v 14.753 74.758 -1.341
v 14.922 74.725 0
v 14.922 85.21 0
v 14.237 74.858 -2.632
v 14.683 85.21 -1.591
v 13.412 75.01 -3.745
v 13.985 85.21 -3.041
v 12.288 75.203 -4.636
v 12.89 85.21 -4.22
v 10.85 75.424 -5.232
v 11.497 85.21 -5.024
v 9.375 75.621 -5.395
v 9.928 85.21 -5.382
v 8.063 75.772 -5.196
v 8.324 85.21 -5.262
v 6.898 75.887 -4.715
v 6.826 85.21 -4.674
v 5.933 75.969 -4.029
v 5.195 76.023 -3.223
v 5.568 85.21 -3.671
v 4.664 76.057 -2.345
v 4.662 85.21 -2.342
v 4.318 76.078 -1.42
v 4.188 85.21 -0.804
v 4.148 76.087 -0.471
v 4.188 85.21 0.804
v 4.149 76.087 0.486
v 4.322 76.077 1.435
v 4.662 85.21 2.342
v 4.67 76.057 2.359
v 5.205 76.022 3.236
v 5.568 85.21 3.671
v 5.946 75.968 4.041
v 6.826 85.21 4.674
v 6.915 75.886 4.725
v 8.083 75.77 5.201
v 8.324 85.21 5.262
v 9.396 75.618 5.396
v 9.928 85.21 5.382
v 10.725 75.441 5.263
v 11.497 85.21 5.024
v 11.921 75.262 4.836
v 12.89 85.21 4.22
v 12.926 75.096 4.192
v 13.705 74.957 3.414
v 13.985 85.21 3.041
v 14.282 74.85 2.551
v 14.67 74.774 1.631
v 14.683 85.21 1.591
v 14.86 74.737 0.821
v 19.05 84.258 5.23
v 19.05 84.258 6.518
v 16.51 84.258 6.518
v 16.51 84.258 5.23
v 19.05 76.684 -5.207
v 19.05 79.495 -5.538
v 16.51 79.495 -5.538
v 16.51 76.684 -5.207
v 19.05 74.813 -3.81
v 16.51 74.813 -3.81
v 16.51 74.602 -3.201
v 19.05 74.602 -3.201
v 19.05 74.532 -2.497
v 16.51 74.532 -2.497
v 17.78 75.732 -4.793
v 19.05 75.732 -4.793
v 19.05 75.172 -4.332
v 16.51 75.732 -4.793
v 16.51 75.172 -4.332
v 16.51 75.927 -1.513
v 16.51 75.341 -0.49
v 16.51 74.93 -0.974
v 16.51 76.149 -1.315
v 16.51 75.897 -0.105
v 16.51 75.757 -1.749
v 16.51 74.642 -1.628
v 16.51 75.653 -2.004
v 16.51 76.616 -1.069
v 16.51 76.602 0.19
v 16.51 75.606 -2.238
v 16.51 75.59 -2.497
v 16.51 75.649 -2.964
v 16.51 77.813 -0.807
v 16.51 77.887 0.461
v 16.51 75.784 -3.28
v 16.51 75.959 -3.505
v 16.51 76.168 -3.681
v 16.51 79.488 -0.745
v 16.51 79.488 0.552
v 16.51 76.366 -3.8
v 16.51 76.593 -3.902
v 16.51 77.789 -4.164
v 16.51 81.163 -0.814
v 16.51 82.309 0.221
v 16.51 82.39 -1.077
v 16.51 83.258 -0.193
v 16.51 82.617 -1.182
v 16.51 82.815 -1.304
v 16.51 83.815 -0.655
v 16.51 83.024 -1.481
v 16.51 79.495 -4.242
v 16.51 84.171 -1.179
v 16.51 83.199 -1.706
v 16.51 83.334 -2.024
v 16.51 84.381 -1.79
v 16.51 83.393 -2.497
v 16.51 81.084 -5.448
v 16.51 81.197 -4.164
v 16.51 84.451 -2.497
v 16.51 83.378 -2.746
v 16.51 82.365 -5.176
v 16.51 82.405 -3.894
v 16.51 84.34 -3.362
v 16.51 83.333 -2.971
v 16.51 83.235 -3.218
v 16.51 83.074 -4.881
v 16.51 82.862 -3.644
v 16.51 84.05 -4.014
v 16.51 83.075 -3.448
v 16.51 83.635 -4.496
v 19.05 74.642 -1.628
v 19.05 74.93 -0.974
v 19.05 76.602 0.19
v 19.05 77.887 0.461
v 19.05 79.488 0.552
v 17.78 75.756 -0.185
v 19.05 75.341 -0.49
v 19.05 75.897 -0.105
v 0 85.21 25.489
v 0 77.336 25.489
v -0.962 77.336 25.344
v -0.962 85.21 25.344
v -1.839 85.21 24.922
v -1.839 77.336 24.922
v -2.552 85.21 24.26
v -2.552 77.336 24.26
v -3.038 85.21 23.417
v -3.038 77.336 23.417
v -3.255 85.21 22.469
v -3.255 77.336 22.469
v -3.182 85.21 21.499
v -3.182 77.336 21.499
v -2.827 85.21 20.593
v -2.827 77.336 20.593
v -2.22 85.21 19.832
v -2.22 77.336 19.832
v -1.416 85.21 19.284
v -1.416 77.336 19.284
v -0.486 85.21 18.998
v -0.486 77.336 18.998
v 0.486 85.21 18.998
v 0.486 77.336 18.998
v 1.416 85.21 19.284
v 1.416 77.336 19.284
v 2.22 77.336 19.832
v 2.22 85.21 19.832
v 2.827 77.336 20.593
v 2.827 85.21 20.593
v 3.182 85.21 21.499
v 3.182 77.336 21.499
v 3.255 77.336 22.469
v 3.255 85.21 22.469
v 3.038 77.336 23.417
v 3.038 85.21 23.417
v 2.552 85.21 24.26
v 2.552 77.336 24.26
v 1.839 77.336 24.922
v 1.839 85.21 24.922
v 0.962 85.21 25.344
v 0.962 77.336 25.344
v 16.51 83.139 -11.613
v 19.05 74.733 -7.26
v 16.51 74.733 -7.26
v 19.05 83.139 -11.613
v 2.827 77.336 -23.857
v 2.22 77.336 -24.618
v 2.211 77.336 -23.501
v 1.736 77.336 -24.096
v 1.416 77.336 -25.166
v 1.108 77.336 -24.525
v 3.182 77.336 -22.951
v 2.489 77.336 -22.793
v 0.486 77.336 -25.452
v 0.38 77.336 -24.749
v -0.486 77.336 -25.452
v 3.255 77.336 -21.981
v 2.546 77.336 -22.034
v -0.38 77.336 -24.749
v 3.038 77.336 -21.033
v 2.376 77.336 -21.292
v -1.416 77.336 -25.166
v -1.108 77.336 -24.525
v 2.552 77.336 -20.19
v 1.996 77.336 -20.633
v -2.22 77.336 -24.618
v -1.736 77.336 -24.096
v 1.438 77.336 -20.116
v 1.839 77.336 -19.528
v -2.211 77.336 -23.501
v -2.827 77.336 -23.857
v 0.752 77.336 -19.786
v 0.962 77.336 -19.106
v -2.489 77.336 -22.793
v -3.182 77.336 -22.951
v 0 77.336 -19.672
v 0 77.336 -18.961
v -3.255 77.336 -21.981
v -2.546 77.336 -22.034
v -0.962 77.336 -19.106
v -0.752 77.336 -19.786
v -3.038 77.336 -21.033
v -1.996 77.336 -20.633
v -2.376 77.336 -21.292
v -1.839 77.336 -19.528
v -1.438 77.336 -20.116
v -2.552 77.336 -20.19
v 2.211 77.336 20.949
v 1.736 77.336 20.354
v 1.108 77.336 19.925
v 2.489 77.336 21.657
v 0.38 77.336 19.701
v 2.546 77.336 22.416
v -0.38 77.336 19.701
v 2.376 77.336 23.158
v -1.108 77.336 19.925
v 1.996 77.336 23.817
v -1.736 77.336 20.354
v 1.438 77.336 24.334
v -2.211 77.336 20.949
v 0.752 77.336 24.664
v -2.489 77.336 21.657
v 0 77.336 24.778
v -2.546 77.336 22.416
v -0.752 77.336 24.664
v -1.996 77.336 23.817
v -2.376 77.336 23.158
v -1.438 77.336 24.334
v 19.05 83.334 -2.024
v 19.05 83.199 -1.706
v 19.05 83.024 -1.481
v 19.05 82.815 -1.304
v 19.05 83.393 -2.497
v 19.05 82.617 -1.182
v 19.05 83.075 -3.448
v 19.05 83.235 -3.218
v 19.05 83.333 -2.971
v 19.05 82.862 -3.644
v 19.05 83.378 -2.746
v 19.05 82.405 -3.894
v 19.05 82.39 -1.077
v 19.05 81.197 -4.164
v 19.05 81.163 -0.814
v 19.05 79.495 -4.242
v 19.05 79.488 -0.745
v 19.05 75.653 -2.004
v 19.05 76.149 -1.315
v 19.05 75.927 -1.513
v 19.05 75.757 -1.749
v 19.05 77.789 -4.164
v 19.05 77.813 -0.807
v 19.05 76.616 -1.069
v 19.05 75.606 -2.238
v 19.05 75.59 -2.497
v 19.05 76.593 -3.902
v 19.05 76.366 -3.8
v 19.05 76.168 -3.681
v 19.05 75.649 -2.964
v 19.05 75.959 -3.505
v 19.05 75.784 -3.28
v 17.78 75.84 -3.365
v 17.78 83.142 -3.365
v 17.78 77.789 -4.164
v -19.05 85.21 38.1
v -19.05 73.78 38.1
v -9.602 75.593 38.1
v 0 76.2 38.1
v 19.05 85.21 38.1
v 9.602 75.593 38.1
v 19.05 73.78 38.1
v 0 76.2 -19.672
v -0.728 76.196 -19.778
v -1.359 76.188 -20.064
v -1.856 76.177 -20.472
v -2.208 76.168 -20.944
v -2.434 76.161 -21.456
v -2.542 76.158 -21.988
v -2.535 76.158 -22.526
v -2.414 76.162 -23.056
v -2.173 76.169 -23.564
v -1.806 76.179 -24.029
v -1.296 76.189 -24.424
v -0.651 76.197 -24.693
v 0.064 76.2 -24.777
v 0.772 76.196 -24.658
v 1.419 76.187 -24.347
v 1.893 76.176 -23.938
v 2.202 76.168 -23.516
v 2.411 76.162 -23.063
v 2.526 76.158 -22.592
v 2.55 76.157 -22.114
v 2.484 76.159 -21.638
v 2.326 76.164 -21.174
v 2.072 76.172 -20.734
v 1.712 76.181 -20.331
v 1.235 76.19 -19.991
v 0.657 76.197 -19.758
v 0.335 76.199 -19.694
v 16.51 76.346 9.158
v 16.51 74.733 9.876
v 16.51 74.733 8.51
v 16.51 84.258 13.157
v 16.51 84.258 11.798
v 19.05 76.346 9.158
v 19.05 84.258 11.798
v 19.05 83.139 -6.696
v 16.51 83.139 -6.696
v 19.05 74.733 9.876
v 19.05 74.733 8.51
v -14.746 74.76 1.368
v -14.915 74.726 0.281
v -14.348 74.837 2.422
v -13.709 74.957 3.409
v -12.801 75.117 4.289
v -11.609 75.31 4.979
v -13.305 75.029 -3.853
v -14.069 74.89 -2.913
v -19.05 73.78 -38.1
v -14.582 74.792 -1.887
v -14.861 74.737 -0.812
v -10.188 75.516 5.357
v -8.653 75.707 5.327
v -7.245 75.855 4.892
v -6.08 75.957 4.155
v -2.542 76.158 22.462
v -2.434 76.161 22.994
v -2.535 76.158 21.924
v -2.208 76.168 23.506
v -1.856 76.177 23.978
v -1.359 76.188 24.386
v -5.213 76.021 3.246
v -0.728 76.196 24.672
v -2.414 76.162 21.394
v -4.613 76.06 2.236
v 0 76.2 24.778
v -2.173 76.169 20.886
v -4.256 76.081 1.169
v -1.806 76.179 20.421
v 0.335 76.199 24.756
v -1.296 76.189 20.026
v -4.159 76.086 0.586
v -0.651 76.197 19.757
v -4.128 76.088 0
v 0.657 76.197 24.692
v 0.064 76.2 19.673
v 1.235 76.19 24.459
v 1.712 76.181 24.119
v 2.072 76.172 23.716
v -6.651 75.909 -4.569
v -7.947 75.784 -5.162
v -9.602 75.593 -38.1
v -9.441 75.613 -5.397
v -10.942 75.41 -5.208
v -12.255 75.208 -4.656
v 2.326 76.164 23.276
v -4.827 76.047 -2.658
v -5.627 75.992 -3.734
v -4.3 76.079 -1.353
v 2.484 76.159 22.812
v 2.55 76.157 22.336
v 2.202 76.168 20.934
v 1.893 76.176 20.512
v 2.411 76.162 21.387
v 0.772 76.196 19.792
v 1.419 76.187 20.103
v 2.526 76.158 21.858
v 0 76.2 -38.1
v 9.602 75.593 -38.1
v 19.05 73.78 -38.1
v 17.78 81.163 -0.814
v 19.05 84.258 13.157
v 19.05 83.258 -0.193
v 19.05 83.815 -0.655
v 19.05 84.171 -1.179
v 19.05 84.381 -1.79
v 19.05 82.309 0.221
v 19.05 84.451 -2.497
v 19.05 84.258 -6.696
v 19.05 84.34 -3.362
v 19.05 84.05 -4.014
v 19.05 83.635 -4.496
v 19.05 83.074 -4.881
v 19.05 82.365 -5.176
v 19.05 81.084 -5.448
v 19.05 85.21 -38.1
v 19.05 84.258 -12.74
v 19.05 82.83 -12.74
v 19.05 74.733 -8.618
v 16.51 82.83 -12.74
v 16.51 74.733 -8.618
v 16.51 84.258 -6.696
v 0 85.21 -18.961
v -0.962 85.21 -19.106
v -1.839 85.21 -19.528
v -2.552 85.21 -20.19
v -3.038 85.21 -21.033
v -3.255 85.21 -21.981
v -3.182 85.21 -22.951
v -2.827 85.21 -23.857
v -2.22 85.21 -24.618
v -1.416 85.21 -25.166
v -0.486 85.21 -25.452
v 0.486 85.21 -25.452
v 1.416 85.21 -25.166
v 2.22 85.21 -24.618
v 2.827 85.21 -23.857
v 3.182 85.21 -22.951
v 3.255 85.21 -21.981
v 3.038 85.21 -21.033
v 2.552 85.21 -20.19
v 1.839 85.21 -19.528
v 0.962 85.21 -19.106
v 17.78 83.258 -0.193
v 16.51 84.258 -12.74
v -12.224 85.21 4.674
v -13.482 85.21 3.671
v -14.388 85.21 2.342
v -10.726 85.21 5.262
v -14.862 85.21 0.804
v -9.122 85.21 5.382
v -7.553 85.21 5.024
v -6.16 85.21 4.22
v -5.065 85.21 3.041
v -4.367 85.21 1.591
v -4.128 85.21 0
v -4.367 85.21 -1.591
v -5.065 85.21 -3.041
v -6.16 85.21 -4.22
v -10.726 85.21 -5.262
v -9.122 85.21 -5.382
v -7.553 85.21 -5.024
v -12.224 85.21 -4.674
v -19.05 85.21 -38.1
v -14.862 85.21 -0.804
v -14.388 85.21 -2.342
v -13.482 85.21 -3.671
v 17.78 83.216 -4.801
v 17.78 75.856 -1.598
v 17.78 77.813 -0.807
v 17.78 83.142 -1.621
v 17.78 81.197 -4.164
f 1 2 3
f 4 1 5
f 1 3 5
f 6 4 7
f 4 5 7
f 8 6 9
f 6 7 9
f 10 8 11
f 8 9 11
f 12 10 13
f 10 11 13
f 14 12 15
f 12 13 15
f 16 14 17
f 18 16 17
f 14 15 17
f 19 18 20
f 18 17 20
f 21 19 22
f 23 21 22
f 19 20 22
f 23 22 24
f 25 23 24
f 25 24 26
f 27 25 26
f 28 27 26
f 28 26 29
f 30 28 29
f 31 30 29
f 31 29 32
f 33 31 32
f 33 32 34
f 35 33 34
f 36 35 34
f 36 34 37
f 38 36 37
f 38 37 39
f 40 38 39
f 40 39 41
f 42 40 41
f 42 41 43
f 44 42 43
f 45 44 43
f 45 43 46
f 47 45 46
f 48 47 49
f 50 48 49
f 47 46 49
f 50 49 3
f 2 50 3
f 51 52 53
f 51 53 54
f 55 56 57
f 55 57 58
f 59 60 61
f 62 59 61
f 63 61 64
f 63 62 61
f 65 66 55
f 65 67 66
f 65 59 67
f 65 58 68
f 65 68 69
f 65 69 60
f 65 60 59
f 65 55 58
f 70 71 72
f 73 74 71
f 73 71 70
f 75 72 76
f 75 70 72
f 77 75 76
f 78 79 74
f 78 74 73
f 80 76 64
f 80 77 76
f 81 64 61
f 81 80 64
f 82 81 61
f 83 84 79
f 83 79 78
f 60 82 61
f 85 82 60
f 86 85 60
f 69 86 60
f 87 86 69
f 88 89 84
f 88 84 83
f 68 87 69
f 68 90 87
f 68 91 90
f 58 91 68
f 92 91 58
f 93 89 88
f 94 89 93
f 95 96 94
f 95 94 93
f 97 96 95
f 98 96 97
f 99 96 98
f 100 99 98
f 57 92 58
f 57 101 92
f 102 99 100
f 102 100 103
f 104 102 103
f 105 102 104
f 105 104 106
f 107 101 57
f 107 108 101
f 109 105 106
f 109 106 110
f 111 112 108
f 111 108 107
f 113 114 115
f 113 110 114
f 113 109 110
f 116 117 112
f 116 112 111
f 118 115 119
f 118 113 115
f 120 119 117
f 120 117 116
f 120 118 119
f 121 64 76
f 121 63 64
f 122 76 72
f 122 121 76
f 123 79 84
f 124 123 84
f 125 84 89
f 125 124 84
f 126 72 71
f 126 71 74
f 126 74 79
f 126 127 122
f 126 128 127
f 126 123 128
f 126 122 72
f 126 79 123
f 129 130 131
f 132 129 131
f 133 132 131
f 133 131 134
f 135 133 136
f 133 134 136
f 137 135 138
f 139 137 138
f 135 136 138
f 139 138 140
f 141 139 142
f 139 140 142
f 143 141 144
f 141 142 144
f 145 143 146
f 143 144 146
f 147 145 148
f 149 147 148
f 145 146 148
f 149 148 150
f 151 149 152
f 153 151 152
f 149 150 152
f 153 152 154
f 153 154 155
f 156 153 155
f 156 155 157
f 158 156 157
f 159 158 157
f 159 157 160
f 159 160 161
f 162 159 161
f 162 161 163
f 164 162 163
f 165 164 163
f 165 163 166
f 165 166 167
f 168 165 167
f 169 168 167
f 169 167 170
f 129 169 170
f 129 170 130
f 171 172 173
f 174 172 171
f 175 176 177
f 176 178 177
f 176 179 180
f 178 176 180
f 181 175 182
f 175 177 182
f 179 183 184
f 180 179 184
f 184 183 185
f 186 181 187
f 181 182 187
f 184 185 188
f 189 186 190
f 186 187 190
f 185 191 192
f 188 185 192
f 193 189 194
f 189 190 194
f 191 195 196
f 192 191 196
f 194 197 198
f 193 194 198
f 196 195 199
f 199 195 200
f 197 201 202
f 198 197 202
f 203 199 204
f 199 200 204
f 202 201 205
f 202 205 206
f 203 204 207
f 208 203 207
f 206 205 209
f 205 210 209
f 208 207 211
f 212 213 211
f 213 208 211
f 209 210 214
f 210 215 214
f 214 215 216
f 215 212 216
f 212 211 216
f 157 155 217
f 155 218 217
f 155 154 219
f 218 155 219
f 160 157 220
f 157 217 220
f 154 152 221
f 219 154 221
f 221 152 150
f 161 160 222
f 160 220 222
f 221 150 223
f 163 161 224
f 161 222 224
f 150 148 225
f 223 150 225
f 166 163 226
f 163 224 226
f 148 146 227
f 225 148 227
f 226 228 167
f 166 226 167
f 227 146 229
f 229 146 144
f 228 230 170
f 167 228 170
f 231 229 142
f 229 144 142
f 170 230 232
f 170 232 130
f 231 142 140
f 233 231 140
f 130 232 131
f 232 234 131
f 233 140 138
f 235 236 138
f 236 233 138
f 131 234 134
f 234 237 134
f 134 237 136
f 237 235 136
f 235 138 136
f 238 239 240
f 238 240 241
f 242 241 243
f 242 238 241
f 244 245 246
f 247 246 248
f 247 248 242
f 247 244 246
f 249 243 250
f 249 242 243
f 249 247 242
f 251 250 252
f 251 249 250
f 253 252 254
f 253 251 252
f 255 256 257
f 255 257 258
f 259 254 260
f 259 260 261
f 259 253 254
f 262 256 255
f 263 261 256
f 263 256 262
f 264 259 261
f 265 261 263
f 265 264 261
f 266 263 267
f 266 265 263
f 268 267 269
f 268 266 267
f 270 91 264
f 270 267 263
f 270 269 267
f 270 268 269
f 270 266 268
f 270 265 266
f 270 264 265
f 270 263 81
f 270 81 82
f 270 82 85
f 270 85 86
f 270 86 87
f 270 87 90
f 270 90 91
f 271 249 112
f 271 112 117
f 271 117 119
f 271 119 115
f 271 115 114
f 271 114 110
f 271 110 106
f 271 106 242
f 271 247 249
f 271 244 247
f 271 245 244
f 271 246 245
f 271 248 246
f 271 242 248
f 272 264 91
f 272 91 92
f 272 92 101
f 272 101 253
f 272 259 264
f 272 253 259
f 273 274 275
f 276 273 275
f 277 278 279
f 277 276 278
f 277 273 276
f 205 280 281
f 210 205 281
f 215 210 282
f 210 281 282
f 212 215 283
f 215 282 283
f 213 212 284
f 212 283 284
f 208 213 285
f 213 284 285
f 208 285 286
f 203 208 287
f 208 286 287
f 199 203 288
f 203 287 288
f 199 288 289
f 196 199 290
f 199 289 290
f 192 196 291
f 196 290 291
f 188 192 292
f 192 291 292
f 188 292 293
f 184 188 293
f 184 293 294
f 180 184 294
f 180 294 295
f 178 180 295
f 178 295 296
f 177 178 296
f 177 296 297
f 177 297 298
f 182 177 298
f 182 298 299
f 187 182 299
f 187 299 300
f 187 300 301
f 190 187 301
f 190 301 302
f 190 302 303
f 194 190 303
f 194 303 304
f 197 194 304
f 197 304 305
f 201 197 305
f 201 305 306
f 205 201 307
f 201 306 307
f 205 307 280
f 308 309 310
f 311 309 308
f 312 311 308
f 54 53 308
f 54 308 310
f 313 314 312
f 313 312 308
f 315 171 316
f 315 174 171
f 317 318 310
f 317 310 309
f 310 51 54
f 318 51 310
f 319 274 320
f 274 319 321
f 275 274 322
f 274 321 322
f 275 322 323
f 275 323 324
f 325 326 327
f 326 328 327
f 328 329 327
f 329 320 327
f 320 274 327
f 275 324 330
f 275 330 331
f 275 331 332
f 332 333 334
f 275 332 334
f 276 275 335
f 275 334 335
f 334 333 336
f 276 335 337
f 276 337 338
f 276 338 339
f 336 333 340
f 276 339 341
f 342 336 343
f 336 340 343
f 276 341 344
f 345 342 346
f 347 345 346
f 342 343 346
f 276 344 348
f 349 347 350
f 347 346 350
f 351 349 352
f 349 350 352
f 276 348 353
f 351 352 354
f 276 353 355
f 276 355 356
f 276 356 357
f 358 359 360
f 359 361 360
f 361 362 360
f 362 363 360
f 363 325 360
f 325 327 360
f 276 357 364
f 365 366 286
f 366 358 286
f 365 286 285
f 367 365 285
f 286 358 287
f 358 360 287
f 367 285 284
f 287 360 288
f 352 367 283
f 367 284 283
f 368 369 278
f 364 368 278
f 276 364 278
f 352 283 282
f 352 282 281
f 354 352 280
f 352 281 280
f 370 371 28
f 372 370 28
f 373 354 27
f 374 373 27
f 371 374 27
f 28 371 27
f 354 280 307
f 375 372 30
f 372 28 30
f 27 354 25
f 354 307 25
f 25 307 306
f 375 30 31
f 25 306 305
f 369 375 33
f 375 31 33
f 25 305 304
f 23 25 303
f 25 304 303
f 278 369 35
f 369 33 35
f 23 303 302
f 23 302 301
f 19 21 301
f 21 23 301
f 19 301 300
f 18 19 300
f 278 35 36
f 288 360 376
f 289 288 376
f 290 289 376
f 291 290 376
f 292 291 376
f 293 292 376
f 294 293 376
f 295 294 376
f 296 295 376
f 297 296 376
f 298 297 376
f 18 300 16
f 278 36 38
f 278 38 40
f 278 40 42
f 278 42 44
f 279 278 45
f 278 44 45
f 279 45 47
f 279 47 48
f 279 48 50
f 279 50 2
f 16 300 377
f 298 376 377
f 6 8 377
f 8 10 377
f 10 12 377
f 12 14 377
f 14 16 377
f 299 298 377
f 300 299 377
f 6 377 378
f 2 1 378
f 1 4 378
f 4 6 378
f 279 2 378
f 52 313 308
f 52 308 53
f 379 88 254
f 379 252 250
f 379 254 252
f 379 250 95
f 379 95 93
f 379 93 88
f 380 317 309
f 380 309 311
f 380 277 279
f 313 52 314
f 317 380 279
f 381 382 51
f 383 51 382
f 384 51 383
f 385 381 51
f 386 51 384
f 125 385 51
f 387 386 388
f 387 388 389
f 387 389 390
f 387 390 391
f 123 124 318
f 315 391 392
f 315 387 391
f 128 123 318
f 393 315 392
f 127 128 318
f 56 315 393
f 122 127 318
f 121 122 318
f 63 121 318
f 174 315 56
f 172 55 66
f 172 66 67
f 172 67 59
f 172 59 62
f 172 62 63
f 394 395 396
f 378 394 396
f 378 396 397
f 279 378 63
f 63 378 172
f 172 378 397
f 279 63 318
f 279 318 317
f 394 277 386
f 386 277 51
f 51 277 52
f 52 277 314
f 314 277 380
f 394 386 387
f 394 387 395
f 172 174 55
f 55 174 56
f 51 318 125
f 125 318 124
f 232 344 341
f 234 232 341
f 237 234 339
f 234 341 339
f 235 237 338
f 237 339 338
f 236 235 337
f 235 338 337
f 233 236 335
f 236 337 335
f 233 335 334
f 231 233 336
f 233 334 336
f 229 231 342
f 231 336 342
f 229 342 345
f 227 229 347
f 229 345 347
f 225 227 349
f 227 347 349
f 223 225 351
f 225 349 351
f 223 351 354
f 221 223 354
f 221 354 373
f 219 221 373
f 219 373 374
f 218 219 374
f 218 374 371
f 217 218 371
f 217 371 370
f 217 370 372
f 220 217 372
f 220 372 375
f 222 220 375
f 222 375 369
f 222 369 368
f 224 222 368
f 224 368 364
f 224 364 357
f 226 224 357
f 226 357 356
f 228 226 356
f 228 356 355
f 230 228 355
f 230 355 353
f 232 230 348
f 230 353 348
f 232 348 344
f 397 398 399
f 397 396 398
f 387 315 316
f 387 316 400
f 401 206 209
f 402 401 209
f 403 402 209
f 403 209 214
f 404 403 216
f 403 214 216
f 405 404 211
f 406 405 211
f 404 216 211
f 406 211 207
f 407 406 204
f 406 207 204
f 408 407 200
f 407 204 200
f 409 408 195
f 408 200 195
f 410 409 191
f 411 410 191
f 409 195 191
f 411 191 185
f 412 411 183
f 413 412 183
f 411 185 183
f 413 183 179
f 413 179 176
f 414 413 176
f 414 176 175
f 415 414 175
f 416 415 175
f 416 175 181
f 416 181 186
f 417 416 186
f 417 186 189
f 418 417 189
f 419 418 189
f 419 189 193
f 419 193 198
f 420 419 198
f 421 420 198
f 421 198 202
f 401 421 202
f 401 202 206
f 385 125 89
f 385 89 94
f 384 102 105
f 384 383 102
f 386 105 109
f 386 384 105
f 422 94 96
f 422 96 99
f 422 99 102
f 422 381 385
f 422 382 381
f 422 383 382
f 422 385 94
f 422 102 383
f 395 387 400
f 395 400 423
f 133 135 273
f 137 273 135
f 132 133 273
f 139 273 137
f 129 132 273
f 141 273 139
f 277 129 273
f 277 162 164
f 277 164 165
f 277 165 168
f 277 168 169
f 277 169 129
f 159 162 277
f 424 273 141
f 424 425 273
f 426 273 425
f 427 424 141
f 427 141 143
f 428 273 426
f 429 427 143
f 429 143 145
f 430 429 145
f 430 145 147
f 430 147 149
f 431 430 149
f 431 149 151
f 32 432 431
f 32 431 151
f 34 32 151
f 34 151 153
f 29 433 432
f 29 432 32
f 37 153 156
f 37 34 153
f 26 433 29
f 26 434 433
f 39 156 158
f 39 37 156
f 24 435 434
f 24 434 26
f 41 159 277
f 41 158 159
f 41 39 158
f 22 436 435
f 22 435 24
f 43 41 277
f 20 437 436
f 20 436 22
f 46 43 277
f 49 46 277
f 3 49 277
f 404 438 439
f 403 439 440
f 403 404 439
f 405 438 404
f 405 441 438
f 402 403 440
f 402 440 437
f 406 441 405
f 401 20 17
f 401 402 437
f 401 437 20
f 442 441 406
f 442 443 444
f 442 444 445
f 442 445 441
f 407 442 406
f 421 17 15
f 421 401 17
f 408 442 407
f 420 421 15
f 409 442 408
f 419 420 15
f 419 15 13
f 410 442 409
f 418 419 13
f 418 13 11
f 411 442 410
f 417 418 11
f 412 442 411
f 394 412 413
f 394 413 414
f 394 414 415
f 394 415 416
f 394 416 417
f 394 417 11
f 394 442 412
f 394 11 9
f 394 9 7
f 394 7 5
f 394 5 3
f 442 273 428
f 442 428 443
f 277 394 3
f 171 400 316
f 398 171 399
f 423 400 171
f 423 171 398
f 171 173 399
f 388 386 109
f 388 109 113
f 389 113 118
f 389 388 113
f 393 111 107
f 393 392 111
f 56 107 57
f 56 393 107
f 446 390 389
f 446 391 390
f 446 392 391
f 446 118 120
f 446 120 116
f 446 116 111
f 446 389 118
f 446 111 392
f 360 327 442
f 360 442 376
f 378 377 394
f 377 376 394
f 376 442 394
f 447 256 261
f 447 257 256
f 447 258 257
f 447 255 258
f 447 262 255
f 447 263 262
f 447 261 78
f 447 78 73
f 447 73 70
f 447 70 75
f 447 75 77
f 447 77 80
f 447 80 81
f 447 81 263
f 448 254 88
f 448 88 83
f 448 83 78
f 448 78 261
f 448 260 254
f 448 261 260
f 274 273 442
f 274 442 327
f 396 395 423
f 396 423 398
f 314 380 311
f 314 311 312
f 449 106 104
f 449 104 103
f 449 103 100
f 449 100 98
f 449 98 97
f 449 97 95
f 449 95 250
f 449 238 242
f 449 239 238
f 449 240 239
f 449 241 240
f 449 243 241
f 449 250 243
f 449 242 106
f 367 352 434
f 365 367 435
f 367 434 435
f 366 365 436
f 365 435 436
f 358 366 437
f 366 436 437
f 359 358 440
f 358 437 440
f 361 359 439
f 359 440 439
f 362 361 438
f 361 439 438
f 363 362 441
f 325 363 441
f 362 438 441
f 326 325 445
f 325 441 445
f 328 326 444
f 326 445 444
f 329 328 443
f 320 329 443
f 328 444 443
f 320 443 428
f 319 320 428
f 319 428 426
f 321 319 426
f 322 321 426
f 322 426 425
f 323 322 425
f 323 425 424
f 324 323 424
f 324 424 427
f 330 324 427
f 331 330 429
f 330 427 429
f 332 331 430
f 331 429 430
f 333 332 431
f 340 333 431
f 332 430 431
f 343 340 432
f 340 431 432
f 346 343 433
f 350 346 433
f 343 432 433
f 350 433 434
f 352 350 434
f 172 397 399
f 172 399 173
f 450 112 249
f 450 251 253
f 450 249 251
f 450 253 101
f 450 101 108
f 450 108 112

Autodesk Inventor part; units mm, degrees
ref_plane "YZ Plane" through (0, 0, 0) normal (1, 0, 0) x (0, 1, 0)
ref_plane "XZ Plane" through (0, 0, 0) normal (0, 1, 0) x (-1, 0, 0)
ref_plane "XY Plane" through (0, 0, 0) normal (0, 0, 1) x (1, 0, 0)
sketch "Sketch1" plane through (0, 0, 0) normal (0, 0, 1) x (1, 0, 0)
  arc A0 (19.05, 73.7803) -> (-19.05, 73.7803) centre (0, 0) ccw
  line L0 (0, 85.2103) -> (19.05, 85.2103)
  line L1 (19.05, 85.2103) -> (19.05, 73.7803)
  line L2 (0, 76.2) -> (0, 85.2103) construction
  line L3 (0, 85.2103) -> (-19.05, 85.2103)
  line L4 (-19.05, 85.2103) -> (-19.05, 73.7803)
  dimension "d0" = 152.4
  dimension "d1" = 19.05
  dimension "d2" = 11.43
extrude "Extrusion1" add sketch "Sketch1" along normal mid plane 76.2
sketch "Sketch23" plane through (-19.05, 85.2103, 38.1) normal (0, 1, 0) x (1, 0, 0)
  line L0 (38.1, 0) -> (0, 0) construction
  line L1 (19.05, 0) -> (19.05, 76.2) construction
  line L2 (0, 76.2) -> (38.1, 76.2) construction
  point P0 (19.05, 38.1)
  point P1 (19.05, 15.875)
  point P2 (19.05, 60.325)
  dimension "d183" = 15.875
  dimension "d184" = 15.875
hole "Hole2" at (0, 85.2103, 22.225) at (0, 85.2103, -22.225) direction (0, -1, 0) diameter 5.1054 end through all counterbore diameter 6.5278 counterbore depth 7.874 clearance for "Hex Machine Screw" size "#10" standard "Ansi Unified Screw Threads"
sketch "Sketch24" plane through (-19.05, 85.2103, 38.1) normal (0, 1, 0) x (1, 0, 0)
  line L0 (0, 76.2) -> (0, 0) construction
  line L1 (0, 38.1) -> (38.1, 38.1) construction
  line L2 (38.1, 76.2) -> (38.1, 0) construction
  line L3 (38.1, 0) -> (0, 0) construction
  line L4 (19.05, 0) -> (19.05, 76.2) construction
  line L5 (0, 76.2) -> (38.1, 76.2) construction
  line L6 (28.575, 38.1) -> (28.575, 38.1) construction
  line L7 (33.9725, 38.1) -> (33.9725, 38.1)
  line L8 (23.1775, 38.1) -> (23.1775, 38.1)
  arc A0 (23.1775, 38.1) -> (33.9725, 38.1) centre (28.575, 38.1) ccw
  arc A1 (33.9725, 38.1) -> (23.1775, 38.1) centre (28.575, 38.1) ccw
  line L9 (9.525, 38.1) -> (9.525, 38.1) construction
  line L10 (14.9225, 38.1) -> (14.9225, 38.1)
  line L11 (4.1275, 38.1) -> (4.1275, 38.1)
  arc A2 (4.1275, 38.1) -> (14.9225, 38.1) centre (9.525, 38.1) ccw
  arc A3 (14.9225, 38.1) -> (4.1275, 38.1) centre (9.525, 38.1) ccw
  point P0 (19.05, 38.1)
  point P1 (28.575, 38.1)
  point P2 (9.525, 38.1)
  dimension "d192" = 9.525
  dimension "d194" = 9.525
  dimension "d195" = 19.05
  dimension "d199" = 10.795
  dimension "d200" = 10.795
extrude "Extrusion8" cut sketch "Sketch24" against normal through all
sketch "Sketch25" plane through (19.05, 73.7803, 38.1) normal (1, 0, 0) x (0, 0, -1)
  line L0 (0, 11.43) -> (0, 0) construction
  line L1 (0, 5.715) -> (76.2, 5.715) construction
  line L2 (76.2, 11.43) -> (76.2, 0) construction
  line L3 (32.8705, 10.4775) -> (29.59, 0.9525)
  line L4 (29.59, 0.9525) -> (28.2238, 0.9525)
  line L5 (28.2238, 0.9525) -> (24.9433, 10.4775)
  line L6 (24.9433, 10.4775) -> (26.3018, 10.4775)
  line L7 (26.3018, 10.4775) -> (28.9416, 2.5657)
  line L8 (28.9416, 2.5657) -> (31.5815, 10.4775)
  line L9 (31.5815, 10.4775) -> (32.8705, 10.4775)
  spline S0 degree 2 poles (43.6382, 5.715) (43.6382, 3.1524) (42.1485, 0.7518) (40.597, 0.7518) knots 0 0 0 1 2 2 2
  spline S1 degree 2 poles (40.597, 0.7518) (39.0224, 0.7518) (37.5481, 3.1987) (37.5481, 5.7073) knots 0 0 0 1 2 2 2
  spline S2 degree 2 poles (37.5481, 5.7073) (37.5481, 8.2854) (39.0378, 10.6705) (40.597, 10.6705) knots 0 0 0 1 2 2 2
  spline S3 degree 2 poles (40.597, 10.6705) (42.1639, 10.6705) (43.6382, 8.2005) (43.6382, 5.715) knots 0 0 0 1 2 2 2
  spline S4 degree 2 poles (42.0019, 2.8127) (42.1871, 3.2836) (42.3415, 4.7347) (42.3415, 5.715) knots 0 0 0 1 2 2 2
  spline S5 degree 2 poles (42.3415, 5.715) (42.3415, 6.6953) (42.1871, 8.1387) (41.9941, 8.625) knots 0 0 0 1 2 2 2
  spline S6 degree 2 poles (41.9941, 8.625) (41.8012, 9.1113) (41.1296, 9.613) (40.597, 9.613) knots 0 0 0 1 2 2 2
  spline S7 degree 2 poles (40.597, 9.613) (40.0644, 9.613) (39.3775, 9.1113) (39.1768, 8.6096) knots 0 0 0 1 2 2 2
  spline S8 degree 2 poles (39.1768, 8.6096) (38.9838, 8.1233) (38.8449, 6.6413) (38.8449, 5.7073) knots 0 0 0 1 2 2 2
  spline S9 degree 2 poles (38.8449, 5.7073) (38.8449, 4.7038) (38.9684, 3.3608) (39.1691, 2.8359) knots 0 0 0 1 2 2 2
  spline S10 degree 2 poles (39.1691, 2.8359) (39.3543, 2.3419) (40.0413, 1.8093) (40.597, 1.8093) knots 0 0 0 1 2 2 2
  spline S11 degree 2 poles (40.597, 1.8093) (41.1219, 1.8093) (41.8089, 2.311) (42.0019, 2.8127) knots 0 0 0 1 2 2 2
  line L10 (50.8399, 9.0495) -> (46.718, 0.9525)
  line L11 (46.718, 0.9525) -> (45.3595, 0.9525)
  line L12 (45.3595, 0.9525) -> (49.7129, 9.3583)
  line L13 (49.7129, 9.3583) -> (44.7961, 9.3583)
  line L14 (44.7961, 9.3583) -> (44.7961, 10.4775)
  line L15 (44.7961, 10.4775) -> (50.8399, 10.4775)
  line L16 (50.8399, 10.4775) -> (50.8399, 9.0495)
  point P0 (38.1, -73.7803)
extrude "Extrusion9" cut sketch "Sketch25" against normal blind 2.54
equation "\"d51\" = 0.125 * Sketch8_Pitch"
equation "\"Sketch8_Pitch\" = 0.79375"
equation "\"d53\" = 60deg"
equation "\"d72\" = 0.125 * Sketch10_Pitch"
equation "\"Sketch10_Pitch\" = 0.79375"
equation "\"d74\" = 60deg"
equation "\"d93\" = 0.125 * Sketch12_Pitch"
equation "\"Sketch12_Pitch\" = 0.79375"
equation "\"d95\" = 60deg"
equation "\"d114\" = 0.125 * Sketch14_Pitch"
equation "\"Sketch14_Pitch\" = 0.79375"
equation "\"d116\" = 60deg"
equation "\"d135\" = 0.125 * Sketch16_Pitch"
equation "\"Sketch16_Pitch\" = 0.79375"
equation "\"d137\" = 60deg"
equation "\"d156\" = 0.125 * Sketch18_Pitch"
equation "\"Sketch18_Pitch\" = 0.79375"
equation "\"d158\" = 60deg"
properties part number "finderSupportPartV07" material "PC/ABS Plastic"
